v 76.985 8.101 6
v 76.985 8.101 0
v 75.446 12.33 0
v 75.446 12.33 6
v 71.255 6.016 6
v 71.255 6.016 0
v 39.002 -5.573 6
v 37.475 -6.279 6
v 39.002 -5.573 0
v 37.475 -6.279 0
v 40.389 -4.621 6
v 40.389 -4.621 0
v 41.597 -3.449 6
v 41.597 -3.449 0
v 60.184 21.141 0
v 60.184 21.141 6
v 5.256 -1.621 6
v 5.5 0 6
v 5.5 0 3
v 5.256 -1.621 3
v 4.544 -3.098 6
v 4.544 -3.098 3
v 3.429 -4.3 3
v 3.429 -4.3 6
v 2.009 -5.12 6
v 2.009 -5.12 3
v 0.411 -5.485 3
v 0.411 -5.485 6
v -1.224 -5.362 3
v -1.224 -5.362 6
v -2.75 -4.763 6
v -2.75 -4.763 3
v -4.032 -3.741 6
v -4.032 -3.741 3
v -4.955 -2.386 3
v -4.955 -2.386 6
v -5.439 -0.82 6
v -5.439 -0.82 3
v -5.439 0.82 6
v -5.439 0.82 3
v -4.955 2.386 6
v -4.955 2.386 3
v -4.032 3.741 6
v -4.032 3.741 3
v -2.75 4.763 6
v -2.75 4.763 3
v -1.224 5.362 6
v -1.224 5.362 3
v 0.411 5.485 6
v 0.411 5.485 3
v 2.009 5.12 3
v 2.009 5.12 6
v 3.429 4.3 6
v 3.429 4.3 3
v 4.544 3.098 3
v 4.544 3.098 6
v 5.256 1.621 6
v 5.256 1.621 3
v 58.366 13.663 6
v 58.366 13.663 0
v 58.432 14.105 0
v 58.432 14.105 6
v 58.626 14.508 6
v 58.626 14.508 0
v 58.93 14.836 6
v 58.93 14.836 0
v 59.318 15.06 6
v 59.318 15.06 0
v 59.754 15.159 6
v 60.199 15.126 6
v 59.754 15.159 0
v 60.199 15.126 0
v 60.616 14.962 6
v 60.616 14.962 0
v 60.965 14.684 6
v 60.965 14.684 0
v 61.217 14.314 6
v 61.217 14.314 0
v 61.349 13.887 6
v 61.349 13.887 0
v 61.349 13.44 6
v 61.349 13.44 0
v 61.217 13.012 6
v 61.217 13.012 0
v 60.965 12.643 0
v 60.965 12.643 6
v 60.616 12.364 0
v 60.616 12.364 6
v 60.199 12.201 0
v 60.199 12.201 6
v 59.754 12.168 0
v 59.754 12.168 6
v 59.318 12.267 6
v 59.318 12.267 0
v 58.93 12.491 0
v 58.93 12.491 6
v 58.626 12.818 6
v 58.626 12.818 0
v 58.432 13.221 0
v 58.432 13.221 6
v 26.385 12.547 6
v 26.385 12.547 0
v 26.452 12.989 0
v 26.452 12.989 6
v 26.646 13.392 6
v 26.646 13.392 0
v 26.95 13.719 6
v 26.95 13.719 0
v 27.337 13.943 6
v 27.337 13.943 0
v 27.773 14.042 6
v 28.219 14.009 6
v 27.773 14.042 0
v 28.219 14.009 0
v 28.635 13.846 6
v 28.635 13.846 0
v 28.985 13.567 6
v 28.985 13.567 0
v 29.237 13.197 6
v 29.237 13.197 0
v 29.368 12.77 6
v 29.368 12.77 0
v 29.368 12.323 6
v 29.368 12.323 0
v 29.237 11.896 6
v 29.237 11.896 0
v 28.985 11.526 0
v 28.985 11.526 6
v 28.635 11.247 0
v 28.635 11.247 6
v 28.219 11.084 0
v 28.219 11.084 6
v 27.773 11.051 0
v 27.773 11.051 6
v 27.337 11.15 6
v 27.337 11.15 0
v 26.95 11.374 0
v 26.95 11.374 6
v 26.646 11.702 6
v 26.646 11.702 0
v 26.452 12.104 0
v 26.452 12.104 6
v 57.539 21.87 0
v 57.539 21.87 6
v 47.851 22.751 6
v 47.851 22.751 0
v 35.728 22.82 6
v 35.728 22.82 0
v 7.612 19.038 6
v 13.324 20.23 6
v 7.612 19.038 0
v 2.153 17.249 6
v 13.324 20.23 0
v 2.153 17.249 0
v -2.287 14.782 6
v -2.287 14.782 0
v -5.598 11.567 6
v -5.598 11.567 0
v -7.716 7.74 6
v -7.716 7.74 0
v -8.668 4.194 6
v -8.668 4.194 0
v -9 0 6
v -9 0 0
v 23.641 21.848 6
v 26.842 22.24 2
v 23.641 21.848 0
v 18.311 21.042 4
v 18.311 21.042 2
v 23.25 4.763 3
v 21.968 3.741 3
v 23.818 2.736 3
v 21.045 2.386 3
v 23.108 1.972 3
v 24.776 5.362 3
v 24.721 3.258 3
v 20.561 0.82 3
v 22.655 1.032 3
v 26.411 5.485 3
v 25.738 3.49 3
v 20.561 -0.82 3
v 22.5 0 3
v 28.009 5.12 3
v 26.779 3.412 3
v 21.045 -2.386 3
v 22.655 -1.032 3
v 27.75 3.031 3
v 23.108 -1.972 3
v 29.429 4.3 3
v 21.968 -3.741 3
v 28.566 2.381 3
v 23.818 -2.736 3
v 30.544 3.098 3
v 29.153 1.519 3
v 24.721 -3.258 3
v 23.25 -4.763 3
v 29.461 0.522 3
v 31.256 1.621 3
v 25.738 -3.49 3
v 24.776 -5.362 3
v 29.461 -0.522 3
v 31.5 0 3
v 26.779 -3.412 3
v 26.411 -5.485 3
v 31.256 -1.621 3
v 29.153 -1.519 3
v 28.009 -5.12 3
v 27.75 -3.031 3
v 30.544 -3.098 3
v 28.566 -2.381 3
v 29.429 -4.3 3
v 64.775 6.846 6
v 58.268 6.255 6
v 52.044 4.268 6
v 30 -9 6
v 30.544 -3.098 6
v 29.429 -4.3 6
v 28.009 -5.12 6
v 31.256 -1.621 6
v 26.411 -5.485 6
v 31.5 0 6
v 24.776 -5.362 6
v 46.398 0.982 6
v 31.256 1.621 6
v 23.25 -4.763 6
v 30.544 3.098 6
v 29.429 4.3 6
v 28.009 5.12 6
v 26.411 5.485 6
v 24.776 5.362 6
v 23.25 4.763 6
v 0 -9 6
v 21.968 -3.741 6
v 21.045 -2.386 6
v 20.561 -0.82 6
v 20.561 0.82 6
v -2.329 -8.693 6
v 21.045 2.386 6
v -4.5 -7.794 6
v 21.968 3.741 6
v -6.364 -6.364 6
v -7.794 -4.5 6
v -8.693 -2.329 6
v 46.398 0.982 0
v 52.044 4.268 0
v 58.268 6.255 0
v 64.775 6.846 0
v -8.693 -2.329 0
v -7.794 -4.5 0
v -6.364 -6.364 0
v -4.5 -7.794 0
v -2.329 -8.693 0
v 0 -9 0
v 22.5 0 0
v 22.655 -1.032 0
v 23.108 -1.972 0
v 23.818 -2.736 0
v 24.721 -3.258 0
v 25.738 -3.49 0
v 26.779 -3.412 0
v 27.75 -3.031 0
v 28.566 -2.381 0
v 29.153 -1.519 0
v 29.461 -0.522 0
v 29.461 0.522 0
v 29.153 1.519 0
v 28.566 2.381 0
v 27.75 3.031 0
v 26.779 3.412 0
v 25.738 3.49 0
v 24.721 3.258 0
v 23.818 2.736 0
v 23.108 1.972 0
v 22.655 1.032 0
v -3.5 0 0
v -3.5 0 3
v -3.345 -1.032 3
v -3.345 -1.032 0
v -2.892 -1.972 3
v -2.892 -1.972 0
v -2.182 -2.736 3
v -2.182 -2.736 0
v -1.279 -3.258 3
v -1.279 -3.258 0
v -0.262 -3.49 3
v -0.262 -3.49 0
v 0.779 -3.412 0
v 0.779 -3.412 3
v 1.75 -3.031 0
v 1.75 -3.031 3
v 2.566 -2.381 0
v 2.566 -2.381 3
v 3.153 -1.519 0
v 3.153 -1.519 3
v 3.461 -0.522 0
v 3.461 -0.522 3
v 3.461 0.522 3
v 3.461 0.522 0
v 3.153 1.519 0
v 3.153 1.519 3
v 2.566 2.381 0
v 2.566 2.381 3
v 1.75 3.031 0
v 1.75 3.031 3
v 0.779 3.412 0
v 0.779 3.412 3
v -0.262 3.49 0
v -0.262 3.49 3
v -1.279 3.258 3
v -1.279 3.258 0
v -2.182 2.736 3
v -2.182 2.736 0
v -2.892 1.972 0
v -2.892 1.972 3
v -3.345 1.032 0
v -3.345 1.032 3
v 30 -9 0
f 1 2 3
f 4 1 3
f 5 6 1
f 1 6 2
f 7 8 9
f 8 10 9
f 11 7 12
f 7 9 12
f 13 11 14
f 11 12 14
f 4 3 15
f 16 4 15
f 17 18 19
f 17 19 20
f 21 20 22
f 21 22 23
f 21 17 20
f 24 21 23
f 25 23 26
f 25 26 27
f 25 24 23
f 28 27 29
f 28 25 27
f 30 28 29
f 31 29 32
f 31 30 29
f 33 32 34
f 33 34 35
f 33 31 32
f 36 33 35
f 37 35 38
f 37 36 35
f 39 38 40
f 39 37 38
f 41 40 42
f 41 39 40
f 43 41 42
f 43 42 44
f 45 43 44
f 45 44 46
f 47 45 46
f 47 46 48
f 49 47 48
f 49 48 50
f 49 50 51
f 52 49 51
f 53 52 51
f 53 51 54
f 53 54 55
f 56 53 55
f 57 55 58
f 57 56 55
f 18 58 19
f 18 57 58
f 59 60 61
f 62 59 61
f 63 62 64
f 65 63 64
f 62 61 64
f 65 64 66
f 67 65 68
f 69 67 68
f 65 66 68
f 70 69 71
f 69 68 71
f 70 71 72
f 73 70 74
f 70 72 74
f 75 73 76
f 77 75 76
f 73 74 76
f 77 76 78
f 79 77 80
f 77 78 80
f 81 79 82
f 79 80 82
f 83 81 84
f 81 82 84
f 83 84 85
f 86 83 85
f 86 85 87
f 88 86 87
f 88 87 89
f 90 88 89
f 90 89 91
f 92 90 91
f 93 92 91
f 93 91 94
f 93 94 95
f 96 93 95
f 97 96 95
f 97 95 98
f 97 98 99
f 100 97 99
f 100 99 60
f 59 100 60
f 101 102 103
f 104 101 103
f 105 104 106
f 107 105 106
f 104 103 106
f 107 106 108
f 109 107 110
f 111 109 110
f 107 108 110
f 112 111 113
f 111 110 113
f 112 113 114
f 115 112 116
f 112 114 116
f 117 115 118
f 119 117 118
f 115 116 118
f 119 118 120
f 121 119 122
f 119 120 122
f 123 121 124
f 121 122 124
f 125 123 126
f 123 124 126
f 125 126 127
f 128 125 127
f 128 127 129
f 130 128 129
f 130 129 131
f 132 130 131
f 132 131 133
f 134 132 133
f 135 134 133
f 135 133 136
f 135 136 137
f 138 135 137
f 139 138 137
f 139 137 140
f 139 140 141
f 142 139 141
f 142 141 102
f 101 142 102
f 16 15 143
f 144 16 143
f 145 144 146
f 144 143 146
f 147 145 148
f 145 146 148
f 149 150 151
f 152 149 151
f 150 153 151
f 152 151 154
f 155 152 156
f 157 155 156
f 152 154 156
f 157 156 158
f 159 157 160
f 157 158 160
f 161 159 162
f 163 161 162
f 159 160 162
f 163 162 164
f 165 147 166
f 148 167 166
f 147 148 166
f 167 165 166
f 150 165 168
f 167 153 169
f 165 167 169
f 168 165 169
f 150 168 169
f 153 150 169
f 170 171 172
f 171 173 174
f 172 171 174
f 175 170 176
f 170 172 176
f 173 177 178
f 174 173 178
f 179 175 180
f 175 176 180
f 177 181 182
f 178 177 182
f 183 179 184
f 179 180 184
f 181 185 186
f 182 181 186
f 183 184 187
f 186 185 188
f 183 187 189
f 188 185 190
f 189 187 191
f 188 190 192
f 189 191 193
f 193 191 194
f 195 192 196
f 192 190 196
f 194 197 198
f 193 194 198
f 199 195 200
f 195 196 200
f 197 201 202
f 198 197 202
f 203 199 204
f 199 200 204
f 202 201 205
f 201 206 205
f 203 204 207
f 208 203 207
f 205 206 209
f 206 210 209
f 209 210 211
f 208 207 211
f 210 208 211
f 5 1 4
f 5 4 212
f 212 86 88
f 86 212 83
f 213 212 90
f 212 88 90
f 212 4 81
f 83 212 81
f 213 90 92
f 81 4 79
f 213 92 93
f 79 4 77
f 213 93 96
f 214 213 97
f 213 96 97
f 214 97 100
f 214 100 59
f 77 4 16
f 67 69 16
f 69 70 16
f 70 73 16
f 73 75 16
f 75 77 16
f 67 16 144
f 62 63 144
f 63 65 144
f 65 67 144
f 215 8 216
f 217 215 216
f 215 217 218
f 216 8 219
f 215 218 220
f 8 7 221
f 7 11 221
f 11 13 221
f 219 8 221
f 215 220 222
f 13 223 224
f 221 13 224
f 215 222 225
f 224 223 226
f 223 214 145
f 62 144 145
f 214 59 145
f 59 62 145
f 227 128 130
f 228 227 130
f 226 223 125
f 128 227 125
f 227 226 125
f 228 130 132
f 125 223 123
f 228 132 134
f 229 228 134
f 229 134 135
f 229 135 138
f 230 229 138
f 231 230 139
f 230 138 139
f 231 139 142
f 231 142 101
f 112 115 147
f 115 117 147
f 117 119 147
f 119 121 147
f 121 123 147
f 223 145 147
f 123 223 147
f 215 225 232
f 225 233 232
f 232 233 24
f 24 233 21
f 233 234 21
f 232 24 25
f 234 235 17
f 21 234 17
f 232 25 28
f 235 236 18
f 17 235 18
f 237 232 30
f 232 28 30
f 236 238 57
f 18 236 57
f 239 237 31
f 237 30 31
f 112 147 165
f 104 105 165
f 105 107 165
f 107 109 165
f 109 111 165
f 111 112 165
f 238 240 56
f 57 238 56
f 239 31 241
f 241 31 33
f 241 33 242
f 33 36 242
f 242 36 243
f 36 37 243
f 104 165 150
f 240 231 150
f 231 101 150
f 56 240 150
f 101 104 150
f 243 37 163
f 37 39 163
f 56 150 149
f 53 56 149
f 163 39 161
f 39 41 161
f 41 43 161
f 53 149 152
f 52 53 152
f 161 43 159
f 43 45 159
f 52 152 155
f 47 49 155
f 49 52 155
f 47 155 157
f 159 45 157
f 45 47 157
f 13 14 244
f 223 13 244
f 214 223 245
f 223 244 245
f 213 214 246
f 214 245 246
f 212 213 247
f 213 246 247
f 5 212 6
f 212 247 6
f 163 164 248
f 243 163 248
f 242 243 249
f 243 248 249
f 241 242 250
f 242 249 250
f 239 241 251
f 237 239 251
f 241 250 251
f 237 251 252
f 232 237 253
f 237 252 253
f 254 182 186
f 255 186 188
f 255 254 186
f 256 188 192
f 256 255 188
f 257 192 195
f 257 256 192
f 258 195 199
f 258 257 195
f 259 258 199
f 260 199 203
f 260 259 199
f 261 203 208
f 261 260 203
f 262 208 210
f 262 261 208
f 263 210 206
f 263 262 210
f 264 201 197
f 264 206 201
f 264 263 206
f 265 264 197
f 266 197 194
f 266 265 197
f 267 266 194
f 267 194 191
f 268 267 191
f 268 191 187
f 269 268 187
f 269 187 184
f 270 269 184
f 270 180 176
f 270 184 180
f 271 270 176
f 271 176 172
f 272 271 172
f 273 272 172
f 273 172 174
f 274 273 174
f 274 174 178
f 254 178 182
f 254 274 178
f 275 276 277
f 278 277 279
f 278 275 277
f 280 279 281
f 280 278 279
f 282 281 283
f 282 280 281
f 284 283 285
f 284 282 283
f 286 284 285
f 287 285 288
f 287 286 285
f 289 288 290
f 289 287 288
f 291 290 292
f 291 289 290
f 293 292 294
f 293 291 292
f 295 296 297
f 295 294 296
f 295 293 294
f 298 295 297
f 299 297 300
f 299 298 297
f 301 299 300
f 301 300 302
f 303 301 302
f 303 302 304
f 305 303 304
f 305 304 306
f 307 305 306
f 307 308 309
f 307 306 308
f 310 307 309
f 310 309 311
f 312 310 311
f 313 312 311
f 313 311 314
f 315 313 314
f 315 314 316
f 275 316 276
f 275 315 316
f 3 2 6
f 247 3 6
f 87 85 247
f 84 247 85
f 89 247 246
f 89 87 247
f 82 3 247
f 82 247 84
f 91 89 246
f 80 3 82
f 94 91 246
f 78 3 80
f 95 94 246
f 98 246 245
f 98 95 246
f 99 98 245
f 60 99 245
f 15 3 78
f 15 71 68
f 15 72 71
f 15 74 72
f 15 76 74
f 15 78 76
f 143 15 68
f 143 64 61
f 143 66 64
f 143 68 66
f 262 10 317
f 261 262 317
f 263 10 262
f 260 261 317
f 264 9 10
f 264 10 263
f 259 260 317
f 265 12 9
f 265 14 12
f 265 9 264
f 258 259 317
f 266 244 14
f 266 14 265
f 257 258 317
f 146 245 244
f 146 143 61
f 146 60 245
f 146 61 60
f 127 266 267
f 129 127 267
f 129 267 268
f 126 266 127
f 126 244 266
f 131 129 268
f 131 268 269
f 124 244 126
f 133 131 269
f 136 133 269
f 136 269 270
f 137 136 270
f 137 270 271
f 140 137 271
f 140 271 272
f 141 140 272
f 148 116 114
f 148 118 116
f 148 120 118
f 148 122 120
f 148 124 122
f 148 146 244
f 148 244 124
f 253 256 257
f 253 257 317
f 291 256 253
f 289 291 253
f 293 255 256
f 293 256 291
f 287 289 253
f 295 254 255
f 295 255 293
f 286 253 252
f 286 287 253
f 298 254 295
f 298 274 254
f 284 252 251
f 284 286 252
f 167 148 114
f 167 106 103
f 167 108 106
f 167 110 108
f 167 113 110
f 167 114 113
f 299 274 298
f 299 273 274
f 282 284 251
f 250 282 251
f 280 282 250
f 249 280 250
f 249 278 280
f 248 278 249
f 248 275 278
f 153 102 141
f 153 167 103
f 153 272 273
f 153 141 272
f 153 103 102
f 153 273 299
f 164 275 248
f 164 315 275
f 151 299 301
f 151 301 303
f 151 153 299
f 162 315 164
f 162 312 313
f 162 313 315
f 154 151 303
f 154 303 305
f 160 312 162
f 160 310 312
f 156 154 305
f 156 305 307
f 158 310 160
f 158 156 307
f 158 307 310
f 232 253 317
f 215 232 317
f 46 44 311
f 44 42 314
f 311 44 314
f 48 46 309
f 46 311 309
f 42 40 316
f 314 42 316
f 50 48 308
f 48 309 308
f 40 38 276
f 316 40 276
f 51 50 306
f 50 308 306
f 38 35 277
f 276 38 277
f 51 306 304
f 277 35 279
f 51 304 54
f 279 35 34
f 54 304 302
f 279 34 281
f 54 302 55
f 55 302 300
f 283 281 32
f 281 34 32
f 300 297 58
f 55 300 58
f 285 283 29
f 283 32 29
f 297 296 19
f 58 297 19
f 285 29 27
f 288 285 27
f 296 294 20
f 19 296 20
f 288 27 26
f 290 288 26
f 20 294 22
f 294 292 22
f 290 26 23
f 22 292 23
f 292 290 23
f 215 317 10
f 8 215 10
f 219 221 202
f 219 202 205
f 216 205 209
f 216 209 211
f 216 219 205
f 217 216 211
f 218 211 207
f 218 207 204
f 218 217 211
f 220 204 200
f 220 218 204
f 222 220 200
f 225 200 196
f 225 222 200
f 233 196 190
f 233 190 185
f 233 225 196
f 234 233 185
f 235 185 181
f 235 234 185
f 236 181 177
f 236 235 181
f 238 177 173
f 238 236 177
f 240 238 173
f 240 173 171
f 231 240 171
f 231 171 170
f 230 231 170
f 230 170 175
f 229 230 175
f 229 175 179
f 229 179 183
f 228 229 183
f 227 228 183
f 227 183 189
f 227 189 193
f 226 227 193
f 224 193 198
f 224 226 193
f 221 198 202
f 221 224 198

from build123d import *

# Parameters (mm, degrees)
SKETCH1_R           = 3.5
EXTRUSION1_DEPTH    = 6
SKETCH3_R           = 30
EXTRUSION3_DEPTH    = 10
FILLET2_R           = 10
BOSS_EXTRUDE1_DEPTH = 6
SKETCH8_R           = 1.5
CUT_EXTRUDE1_DEPTH  = 14
CUT_EXTRUDE2_START  = -6
SKETCH7_R           = 5.5
CUT_EXTRUDE2_DEPTH  = 3


with BuildPart() as part:
    # Sketch1 → Extrusion1 (new body)
    with BuildSketch(Plane.XY):
        with BuildLine():
            Line((0, -9), (30, -9))
            Line((30, -9), (76.984631039, 8.101007166))
            Line((76.984631039, 8.101007166), (75.445540394, 12.32962396))
            Line((75.445540394, 12.32962396), (60.183576084, 21.141123163))
            Line((60.183576084, 21.141123163), (26.826114347, 9))
            Line((26.826114347, 9), (0, 9))
            ThreePointArc((0, 9), (-9, 0), (0, -9))
        make_face()
        with Locations(Location((0, 0, 0), (0, 0, 180))):
            Circle(SKETCH1_R, mode=Mode.SUBTRACT)
        with Locations(Location((26, 0, 0), (0, 0, 180))):
            Circle(SKETCH1_R, mode=Mode.SUBTRACT)
    extrude(amount=EXTRUSION1_DEPTH)

    # Sketch3 → Extrusion3 (cut)
    with BuildSketch(Plane(origin=(0, 0, 0), x_dir=(-1, 0, 0), z_dir=(0, 0, -1))):
        with Locations((-64.222352322, -23.14852672)):
            Circle(SKETCH3_R)
    extrude(amount=-EXTRUSION3_DEPTH, mode=Mode.SUBTRACT)

    # Fillet2
    fillet2_edges = [part.edges().sort_by_distance(p)[0] for p in [
        (40.088809532, -5.327973631, 3),
    ]]
    fillet(fillet2_edges, radius=FILLET2_R)

    # Sketch6 → Boss-Extrude1 (add)
    with BuildSketch(Plane(origin=(0, 0, 0), x_dir=(-1, 0, 0), z_dir=(0, 0, -1))):
        with BuildLine():
            ThreePointArc((0, 9), (6.363961031, 6.363961031), (9, 0))
            add(Edge.make_bspline(
                [(-60.183576084, 21.141123163), (-57.582994943, 22.642569384), (-35.785366448, 23.838648882), (-8.377062942, 19.440019234), (9, 16.91404675), (9, 0)],
                knots=[0, 0, 0, 0, 0.435384133, 0.535384133, 1, 1, 1, 1], degree=3))
            Line((-60.183576084, 21.141123163), (-26.826114347, 9))
            Line((-26.826114347, 9), (0, 9))
        make_face()
    extrude(amount=-BOSS_EXTRUDE1_DEPTH)

    # Sketch8 → Cut-Extrude1 (cut)
    with BuildSketch(Plane(origin=(0, 0, 0), x_dir=(-1, 0, 0), z_dir=(0, 0, -1))):
        with Locations((-59.865613746, 13.663313065)):
            Circle(SKETCH8_R)
        with Locations((-27.885107281, 12.546529171)):
            Circle(SKETCH8_R)
    extrude(amount=-CUT_EXTRUDE1_DEPTH, mode=Mode.SUBTRACT)

    # Sketch7 → Cut-Extrude2 (cut)
    with BuildSketch(Plane(origin=(0, 0, 0), x_dir=(-1, 0, 0), z_dir=(0, 0, -1)).offset(CUT_EXTRUDE2_START)):
        with Locations(Location((0, 0, 0), (0, 0, 180))):
            Circle(SKETCH7_R)
        with Locations(Location((-26, 0, 0), (0, 0, 180))):
            Circle(SKETCH7_R)
    extrude(amount=CUT_EXTRUDE2_DEPTH, mode=Mode.SUBTRACT)


solid = part.part
